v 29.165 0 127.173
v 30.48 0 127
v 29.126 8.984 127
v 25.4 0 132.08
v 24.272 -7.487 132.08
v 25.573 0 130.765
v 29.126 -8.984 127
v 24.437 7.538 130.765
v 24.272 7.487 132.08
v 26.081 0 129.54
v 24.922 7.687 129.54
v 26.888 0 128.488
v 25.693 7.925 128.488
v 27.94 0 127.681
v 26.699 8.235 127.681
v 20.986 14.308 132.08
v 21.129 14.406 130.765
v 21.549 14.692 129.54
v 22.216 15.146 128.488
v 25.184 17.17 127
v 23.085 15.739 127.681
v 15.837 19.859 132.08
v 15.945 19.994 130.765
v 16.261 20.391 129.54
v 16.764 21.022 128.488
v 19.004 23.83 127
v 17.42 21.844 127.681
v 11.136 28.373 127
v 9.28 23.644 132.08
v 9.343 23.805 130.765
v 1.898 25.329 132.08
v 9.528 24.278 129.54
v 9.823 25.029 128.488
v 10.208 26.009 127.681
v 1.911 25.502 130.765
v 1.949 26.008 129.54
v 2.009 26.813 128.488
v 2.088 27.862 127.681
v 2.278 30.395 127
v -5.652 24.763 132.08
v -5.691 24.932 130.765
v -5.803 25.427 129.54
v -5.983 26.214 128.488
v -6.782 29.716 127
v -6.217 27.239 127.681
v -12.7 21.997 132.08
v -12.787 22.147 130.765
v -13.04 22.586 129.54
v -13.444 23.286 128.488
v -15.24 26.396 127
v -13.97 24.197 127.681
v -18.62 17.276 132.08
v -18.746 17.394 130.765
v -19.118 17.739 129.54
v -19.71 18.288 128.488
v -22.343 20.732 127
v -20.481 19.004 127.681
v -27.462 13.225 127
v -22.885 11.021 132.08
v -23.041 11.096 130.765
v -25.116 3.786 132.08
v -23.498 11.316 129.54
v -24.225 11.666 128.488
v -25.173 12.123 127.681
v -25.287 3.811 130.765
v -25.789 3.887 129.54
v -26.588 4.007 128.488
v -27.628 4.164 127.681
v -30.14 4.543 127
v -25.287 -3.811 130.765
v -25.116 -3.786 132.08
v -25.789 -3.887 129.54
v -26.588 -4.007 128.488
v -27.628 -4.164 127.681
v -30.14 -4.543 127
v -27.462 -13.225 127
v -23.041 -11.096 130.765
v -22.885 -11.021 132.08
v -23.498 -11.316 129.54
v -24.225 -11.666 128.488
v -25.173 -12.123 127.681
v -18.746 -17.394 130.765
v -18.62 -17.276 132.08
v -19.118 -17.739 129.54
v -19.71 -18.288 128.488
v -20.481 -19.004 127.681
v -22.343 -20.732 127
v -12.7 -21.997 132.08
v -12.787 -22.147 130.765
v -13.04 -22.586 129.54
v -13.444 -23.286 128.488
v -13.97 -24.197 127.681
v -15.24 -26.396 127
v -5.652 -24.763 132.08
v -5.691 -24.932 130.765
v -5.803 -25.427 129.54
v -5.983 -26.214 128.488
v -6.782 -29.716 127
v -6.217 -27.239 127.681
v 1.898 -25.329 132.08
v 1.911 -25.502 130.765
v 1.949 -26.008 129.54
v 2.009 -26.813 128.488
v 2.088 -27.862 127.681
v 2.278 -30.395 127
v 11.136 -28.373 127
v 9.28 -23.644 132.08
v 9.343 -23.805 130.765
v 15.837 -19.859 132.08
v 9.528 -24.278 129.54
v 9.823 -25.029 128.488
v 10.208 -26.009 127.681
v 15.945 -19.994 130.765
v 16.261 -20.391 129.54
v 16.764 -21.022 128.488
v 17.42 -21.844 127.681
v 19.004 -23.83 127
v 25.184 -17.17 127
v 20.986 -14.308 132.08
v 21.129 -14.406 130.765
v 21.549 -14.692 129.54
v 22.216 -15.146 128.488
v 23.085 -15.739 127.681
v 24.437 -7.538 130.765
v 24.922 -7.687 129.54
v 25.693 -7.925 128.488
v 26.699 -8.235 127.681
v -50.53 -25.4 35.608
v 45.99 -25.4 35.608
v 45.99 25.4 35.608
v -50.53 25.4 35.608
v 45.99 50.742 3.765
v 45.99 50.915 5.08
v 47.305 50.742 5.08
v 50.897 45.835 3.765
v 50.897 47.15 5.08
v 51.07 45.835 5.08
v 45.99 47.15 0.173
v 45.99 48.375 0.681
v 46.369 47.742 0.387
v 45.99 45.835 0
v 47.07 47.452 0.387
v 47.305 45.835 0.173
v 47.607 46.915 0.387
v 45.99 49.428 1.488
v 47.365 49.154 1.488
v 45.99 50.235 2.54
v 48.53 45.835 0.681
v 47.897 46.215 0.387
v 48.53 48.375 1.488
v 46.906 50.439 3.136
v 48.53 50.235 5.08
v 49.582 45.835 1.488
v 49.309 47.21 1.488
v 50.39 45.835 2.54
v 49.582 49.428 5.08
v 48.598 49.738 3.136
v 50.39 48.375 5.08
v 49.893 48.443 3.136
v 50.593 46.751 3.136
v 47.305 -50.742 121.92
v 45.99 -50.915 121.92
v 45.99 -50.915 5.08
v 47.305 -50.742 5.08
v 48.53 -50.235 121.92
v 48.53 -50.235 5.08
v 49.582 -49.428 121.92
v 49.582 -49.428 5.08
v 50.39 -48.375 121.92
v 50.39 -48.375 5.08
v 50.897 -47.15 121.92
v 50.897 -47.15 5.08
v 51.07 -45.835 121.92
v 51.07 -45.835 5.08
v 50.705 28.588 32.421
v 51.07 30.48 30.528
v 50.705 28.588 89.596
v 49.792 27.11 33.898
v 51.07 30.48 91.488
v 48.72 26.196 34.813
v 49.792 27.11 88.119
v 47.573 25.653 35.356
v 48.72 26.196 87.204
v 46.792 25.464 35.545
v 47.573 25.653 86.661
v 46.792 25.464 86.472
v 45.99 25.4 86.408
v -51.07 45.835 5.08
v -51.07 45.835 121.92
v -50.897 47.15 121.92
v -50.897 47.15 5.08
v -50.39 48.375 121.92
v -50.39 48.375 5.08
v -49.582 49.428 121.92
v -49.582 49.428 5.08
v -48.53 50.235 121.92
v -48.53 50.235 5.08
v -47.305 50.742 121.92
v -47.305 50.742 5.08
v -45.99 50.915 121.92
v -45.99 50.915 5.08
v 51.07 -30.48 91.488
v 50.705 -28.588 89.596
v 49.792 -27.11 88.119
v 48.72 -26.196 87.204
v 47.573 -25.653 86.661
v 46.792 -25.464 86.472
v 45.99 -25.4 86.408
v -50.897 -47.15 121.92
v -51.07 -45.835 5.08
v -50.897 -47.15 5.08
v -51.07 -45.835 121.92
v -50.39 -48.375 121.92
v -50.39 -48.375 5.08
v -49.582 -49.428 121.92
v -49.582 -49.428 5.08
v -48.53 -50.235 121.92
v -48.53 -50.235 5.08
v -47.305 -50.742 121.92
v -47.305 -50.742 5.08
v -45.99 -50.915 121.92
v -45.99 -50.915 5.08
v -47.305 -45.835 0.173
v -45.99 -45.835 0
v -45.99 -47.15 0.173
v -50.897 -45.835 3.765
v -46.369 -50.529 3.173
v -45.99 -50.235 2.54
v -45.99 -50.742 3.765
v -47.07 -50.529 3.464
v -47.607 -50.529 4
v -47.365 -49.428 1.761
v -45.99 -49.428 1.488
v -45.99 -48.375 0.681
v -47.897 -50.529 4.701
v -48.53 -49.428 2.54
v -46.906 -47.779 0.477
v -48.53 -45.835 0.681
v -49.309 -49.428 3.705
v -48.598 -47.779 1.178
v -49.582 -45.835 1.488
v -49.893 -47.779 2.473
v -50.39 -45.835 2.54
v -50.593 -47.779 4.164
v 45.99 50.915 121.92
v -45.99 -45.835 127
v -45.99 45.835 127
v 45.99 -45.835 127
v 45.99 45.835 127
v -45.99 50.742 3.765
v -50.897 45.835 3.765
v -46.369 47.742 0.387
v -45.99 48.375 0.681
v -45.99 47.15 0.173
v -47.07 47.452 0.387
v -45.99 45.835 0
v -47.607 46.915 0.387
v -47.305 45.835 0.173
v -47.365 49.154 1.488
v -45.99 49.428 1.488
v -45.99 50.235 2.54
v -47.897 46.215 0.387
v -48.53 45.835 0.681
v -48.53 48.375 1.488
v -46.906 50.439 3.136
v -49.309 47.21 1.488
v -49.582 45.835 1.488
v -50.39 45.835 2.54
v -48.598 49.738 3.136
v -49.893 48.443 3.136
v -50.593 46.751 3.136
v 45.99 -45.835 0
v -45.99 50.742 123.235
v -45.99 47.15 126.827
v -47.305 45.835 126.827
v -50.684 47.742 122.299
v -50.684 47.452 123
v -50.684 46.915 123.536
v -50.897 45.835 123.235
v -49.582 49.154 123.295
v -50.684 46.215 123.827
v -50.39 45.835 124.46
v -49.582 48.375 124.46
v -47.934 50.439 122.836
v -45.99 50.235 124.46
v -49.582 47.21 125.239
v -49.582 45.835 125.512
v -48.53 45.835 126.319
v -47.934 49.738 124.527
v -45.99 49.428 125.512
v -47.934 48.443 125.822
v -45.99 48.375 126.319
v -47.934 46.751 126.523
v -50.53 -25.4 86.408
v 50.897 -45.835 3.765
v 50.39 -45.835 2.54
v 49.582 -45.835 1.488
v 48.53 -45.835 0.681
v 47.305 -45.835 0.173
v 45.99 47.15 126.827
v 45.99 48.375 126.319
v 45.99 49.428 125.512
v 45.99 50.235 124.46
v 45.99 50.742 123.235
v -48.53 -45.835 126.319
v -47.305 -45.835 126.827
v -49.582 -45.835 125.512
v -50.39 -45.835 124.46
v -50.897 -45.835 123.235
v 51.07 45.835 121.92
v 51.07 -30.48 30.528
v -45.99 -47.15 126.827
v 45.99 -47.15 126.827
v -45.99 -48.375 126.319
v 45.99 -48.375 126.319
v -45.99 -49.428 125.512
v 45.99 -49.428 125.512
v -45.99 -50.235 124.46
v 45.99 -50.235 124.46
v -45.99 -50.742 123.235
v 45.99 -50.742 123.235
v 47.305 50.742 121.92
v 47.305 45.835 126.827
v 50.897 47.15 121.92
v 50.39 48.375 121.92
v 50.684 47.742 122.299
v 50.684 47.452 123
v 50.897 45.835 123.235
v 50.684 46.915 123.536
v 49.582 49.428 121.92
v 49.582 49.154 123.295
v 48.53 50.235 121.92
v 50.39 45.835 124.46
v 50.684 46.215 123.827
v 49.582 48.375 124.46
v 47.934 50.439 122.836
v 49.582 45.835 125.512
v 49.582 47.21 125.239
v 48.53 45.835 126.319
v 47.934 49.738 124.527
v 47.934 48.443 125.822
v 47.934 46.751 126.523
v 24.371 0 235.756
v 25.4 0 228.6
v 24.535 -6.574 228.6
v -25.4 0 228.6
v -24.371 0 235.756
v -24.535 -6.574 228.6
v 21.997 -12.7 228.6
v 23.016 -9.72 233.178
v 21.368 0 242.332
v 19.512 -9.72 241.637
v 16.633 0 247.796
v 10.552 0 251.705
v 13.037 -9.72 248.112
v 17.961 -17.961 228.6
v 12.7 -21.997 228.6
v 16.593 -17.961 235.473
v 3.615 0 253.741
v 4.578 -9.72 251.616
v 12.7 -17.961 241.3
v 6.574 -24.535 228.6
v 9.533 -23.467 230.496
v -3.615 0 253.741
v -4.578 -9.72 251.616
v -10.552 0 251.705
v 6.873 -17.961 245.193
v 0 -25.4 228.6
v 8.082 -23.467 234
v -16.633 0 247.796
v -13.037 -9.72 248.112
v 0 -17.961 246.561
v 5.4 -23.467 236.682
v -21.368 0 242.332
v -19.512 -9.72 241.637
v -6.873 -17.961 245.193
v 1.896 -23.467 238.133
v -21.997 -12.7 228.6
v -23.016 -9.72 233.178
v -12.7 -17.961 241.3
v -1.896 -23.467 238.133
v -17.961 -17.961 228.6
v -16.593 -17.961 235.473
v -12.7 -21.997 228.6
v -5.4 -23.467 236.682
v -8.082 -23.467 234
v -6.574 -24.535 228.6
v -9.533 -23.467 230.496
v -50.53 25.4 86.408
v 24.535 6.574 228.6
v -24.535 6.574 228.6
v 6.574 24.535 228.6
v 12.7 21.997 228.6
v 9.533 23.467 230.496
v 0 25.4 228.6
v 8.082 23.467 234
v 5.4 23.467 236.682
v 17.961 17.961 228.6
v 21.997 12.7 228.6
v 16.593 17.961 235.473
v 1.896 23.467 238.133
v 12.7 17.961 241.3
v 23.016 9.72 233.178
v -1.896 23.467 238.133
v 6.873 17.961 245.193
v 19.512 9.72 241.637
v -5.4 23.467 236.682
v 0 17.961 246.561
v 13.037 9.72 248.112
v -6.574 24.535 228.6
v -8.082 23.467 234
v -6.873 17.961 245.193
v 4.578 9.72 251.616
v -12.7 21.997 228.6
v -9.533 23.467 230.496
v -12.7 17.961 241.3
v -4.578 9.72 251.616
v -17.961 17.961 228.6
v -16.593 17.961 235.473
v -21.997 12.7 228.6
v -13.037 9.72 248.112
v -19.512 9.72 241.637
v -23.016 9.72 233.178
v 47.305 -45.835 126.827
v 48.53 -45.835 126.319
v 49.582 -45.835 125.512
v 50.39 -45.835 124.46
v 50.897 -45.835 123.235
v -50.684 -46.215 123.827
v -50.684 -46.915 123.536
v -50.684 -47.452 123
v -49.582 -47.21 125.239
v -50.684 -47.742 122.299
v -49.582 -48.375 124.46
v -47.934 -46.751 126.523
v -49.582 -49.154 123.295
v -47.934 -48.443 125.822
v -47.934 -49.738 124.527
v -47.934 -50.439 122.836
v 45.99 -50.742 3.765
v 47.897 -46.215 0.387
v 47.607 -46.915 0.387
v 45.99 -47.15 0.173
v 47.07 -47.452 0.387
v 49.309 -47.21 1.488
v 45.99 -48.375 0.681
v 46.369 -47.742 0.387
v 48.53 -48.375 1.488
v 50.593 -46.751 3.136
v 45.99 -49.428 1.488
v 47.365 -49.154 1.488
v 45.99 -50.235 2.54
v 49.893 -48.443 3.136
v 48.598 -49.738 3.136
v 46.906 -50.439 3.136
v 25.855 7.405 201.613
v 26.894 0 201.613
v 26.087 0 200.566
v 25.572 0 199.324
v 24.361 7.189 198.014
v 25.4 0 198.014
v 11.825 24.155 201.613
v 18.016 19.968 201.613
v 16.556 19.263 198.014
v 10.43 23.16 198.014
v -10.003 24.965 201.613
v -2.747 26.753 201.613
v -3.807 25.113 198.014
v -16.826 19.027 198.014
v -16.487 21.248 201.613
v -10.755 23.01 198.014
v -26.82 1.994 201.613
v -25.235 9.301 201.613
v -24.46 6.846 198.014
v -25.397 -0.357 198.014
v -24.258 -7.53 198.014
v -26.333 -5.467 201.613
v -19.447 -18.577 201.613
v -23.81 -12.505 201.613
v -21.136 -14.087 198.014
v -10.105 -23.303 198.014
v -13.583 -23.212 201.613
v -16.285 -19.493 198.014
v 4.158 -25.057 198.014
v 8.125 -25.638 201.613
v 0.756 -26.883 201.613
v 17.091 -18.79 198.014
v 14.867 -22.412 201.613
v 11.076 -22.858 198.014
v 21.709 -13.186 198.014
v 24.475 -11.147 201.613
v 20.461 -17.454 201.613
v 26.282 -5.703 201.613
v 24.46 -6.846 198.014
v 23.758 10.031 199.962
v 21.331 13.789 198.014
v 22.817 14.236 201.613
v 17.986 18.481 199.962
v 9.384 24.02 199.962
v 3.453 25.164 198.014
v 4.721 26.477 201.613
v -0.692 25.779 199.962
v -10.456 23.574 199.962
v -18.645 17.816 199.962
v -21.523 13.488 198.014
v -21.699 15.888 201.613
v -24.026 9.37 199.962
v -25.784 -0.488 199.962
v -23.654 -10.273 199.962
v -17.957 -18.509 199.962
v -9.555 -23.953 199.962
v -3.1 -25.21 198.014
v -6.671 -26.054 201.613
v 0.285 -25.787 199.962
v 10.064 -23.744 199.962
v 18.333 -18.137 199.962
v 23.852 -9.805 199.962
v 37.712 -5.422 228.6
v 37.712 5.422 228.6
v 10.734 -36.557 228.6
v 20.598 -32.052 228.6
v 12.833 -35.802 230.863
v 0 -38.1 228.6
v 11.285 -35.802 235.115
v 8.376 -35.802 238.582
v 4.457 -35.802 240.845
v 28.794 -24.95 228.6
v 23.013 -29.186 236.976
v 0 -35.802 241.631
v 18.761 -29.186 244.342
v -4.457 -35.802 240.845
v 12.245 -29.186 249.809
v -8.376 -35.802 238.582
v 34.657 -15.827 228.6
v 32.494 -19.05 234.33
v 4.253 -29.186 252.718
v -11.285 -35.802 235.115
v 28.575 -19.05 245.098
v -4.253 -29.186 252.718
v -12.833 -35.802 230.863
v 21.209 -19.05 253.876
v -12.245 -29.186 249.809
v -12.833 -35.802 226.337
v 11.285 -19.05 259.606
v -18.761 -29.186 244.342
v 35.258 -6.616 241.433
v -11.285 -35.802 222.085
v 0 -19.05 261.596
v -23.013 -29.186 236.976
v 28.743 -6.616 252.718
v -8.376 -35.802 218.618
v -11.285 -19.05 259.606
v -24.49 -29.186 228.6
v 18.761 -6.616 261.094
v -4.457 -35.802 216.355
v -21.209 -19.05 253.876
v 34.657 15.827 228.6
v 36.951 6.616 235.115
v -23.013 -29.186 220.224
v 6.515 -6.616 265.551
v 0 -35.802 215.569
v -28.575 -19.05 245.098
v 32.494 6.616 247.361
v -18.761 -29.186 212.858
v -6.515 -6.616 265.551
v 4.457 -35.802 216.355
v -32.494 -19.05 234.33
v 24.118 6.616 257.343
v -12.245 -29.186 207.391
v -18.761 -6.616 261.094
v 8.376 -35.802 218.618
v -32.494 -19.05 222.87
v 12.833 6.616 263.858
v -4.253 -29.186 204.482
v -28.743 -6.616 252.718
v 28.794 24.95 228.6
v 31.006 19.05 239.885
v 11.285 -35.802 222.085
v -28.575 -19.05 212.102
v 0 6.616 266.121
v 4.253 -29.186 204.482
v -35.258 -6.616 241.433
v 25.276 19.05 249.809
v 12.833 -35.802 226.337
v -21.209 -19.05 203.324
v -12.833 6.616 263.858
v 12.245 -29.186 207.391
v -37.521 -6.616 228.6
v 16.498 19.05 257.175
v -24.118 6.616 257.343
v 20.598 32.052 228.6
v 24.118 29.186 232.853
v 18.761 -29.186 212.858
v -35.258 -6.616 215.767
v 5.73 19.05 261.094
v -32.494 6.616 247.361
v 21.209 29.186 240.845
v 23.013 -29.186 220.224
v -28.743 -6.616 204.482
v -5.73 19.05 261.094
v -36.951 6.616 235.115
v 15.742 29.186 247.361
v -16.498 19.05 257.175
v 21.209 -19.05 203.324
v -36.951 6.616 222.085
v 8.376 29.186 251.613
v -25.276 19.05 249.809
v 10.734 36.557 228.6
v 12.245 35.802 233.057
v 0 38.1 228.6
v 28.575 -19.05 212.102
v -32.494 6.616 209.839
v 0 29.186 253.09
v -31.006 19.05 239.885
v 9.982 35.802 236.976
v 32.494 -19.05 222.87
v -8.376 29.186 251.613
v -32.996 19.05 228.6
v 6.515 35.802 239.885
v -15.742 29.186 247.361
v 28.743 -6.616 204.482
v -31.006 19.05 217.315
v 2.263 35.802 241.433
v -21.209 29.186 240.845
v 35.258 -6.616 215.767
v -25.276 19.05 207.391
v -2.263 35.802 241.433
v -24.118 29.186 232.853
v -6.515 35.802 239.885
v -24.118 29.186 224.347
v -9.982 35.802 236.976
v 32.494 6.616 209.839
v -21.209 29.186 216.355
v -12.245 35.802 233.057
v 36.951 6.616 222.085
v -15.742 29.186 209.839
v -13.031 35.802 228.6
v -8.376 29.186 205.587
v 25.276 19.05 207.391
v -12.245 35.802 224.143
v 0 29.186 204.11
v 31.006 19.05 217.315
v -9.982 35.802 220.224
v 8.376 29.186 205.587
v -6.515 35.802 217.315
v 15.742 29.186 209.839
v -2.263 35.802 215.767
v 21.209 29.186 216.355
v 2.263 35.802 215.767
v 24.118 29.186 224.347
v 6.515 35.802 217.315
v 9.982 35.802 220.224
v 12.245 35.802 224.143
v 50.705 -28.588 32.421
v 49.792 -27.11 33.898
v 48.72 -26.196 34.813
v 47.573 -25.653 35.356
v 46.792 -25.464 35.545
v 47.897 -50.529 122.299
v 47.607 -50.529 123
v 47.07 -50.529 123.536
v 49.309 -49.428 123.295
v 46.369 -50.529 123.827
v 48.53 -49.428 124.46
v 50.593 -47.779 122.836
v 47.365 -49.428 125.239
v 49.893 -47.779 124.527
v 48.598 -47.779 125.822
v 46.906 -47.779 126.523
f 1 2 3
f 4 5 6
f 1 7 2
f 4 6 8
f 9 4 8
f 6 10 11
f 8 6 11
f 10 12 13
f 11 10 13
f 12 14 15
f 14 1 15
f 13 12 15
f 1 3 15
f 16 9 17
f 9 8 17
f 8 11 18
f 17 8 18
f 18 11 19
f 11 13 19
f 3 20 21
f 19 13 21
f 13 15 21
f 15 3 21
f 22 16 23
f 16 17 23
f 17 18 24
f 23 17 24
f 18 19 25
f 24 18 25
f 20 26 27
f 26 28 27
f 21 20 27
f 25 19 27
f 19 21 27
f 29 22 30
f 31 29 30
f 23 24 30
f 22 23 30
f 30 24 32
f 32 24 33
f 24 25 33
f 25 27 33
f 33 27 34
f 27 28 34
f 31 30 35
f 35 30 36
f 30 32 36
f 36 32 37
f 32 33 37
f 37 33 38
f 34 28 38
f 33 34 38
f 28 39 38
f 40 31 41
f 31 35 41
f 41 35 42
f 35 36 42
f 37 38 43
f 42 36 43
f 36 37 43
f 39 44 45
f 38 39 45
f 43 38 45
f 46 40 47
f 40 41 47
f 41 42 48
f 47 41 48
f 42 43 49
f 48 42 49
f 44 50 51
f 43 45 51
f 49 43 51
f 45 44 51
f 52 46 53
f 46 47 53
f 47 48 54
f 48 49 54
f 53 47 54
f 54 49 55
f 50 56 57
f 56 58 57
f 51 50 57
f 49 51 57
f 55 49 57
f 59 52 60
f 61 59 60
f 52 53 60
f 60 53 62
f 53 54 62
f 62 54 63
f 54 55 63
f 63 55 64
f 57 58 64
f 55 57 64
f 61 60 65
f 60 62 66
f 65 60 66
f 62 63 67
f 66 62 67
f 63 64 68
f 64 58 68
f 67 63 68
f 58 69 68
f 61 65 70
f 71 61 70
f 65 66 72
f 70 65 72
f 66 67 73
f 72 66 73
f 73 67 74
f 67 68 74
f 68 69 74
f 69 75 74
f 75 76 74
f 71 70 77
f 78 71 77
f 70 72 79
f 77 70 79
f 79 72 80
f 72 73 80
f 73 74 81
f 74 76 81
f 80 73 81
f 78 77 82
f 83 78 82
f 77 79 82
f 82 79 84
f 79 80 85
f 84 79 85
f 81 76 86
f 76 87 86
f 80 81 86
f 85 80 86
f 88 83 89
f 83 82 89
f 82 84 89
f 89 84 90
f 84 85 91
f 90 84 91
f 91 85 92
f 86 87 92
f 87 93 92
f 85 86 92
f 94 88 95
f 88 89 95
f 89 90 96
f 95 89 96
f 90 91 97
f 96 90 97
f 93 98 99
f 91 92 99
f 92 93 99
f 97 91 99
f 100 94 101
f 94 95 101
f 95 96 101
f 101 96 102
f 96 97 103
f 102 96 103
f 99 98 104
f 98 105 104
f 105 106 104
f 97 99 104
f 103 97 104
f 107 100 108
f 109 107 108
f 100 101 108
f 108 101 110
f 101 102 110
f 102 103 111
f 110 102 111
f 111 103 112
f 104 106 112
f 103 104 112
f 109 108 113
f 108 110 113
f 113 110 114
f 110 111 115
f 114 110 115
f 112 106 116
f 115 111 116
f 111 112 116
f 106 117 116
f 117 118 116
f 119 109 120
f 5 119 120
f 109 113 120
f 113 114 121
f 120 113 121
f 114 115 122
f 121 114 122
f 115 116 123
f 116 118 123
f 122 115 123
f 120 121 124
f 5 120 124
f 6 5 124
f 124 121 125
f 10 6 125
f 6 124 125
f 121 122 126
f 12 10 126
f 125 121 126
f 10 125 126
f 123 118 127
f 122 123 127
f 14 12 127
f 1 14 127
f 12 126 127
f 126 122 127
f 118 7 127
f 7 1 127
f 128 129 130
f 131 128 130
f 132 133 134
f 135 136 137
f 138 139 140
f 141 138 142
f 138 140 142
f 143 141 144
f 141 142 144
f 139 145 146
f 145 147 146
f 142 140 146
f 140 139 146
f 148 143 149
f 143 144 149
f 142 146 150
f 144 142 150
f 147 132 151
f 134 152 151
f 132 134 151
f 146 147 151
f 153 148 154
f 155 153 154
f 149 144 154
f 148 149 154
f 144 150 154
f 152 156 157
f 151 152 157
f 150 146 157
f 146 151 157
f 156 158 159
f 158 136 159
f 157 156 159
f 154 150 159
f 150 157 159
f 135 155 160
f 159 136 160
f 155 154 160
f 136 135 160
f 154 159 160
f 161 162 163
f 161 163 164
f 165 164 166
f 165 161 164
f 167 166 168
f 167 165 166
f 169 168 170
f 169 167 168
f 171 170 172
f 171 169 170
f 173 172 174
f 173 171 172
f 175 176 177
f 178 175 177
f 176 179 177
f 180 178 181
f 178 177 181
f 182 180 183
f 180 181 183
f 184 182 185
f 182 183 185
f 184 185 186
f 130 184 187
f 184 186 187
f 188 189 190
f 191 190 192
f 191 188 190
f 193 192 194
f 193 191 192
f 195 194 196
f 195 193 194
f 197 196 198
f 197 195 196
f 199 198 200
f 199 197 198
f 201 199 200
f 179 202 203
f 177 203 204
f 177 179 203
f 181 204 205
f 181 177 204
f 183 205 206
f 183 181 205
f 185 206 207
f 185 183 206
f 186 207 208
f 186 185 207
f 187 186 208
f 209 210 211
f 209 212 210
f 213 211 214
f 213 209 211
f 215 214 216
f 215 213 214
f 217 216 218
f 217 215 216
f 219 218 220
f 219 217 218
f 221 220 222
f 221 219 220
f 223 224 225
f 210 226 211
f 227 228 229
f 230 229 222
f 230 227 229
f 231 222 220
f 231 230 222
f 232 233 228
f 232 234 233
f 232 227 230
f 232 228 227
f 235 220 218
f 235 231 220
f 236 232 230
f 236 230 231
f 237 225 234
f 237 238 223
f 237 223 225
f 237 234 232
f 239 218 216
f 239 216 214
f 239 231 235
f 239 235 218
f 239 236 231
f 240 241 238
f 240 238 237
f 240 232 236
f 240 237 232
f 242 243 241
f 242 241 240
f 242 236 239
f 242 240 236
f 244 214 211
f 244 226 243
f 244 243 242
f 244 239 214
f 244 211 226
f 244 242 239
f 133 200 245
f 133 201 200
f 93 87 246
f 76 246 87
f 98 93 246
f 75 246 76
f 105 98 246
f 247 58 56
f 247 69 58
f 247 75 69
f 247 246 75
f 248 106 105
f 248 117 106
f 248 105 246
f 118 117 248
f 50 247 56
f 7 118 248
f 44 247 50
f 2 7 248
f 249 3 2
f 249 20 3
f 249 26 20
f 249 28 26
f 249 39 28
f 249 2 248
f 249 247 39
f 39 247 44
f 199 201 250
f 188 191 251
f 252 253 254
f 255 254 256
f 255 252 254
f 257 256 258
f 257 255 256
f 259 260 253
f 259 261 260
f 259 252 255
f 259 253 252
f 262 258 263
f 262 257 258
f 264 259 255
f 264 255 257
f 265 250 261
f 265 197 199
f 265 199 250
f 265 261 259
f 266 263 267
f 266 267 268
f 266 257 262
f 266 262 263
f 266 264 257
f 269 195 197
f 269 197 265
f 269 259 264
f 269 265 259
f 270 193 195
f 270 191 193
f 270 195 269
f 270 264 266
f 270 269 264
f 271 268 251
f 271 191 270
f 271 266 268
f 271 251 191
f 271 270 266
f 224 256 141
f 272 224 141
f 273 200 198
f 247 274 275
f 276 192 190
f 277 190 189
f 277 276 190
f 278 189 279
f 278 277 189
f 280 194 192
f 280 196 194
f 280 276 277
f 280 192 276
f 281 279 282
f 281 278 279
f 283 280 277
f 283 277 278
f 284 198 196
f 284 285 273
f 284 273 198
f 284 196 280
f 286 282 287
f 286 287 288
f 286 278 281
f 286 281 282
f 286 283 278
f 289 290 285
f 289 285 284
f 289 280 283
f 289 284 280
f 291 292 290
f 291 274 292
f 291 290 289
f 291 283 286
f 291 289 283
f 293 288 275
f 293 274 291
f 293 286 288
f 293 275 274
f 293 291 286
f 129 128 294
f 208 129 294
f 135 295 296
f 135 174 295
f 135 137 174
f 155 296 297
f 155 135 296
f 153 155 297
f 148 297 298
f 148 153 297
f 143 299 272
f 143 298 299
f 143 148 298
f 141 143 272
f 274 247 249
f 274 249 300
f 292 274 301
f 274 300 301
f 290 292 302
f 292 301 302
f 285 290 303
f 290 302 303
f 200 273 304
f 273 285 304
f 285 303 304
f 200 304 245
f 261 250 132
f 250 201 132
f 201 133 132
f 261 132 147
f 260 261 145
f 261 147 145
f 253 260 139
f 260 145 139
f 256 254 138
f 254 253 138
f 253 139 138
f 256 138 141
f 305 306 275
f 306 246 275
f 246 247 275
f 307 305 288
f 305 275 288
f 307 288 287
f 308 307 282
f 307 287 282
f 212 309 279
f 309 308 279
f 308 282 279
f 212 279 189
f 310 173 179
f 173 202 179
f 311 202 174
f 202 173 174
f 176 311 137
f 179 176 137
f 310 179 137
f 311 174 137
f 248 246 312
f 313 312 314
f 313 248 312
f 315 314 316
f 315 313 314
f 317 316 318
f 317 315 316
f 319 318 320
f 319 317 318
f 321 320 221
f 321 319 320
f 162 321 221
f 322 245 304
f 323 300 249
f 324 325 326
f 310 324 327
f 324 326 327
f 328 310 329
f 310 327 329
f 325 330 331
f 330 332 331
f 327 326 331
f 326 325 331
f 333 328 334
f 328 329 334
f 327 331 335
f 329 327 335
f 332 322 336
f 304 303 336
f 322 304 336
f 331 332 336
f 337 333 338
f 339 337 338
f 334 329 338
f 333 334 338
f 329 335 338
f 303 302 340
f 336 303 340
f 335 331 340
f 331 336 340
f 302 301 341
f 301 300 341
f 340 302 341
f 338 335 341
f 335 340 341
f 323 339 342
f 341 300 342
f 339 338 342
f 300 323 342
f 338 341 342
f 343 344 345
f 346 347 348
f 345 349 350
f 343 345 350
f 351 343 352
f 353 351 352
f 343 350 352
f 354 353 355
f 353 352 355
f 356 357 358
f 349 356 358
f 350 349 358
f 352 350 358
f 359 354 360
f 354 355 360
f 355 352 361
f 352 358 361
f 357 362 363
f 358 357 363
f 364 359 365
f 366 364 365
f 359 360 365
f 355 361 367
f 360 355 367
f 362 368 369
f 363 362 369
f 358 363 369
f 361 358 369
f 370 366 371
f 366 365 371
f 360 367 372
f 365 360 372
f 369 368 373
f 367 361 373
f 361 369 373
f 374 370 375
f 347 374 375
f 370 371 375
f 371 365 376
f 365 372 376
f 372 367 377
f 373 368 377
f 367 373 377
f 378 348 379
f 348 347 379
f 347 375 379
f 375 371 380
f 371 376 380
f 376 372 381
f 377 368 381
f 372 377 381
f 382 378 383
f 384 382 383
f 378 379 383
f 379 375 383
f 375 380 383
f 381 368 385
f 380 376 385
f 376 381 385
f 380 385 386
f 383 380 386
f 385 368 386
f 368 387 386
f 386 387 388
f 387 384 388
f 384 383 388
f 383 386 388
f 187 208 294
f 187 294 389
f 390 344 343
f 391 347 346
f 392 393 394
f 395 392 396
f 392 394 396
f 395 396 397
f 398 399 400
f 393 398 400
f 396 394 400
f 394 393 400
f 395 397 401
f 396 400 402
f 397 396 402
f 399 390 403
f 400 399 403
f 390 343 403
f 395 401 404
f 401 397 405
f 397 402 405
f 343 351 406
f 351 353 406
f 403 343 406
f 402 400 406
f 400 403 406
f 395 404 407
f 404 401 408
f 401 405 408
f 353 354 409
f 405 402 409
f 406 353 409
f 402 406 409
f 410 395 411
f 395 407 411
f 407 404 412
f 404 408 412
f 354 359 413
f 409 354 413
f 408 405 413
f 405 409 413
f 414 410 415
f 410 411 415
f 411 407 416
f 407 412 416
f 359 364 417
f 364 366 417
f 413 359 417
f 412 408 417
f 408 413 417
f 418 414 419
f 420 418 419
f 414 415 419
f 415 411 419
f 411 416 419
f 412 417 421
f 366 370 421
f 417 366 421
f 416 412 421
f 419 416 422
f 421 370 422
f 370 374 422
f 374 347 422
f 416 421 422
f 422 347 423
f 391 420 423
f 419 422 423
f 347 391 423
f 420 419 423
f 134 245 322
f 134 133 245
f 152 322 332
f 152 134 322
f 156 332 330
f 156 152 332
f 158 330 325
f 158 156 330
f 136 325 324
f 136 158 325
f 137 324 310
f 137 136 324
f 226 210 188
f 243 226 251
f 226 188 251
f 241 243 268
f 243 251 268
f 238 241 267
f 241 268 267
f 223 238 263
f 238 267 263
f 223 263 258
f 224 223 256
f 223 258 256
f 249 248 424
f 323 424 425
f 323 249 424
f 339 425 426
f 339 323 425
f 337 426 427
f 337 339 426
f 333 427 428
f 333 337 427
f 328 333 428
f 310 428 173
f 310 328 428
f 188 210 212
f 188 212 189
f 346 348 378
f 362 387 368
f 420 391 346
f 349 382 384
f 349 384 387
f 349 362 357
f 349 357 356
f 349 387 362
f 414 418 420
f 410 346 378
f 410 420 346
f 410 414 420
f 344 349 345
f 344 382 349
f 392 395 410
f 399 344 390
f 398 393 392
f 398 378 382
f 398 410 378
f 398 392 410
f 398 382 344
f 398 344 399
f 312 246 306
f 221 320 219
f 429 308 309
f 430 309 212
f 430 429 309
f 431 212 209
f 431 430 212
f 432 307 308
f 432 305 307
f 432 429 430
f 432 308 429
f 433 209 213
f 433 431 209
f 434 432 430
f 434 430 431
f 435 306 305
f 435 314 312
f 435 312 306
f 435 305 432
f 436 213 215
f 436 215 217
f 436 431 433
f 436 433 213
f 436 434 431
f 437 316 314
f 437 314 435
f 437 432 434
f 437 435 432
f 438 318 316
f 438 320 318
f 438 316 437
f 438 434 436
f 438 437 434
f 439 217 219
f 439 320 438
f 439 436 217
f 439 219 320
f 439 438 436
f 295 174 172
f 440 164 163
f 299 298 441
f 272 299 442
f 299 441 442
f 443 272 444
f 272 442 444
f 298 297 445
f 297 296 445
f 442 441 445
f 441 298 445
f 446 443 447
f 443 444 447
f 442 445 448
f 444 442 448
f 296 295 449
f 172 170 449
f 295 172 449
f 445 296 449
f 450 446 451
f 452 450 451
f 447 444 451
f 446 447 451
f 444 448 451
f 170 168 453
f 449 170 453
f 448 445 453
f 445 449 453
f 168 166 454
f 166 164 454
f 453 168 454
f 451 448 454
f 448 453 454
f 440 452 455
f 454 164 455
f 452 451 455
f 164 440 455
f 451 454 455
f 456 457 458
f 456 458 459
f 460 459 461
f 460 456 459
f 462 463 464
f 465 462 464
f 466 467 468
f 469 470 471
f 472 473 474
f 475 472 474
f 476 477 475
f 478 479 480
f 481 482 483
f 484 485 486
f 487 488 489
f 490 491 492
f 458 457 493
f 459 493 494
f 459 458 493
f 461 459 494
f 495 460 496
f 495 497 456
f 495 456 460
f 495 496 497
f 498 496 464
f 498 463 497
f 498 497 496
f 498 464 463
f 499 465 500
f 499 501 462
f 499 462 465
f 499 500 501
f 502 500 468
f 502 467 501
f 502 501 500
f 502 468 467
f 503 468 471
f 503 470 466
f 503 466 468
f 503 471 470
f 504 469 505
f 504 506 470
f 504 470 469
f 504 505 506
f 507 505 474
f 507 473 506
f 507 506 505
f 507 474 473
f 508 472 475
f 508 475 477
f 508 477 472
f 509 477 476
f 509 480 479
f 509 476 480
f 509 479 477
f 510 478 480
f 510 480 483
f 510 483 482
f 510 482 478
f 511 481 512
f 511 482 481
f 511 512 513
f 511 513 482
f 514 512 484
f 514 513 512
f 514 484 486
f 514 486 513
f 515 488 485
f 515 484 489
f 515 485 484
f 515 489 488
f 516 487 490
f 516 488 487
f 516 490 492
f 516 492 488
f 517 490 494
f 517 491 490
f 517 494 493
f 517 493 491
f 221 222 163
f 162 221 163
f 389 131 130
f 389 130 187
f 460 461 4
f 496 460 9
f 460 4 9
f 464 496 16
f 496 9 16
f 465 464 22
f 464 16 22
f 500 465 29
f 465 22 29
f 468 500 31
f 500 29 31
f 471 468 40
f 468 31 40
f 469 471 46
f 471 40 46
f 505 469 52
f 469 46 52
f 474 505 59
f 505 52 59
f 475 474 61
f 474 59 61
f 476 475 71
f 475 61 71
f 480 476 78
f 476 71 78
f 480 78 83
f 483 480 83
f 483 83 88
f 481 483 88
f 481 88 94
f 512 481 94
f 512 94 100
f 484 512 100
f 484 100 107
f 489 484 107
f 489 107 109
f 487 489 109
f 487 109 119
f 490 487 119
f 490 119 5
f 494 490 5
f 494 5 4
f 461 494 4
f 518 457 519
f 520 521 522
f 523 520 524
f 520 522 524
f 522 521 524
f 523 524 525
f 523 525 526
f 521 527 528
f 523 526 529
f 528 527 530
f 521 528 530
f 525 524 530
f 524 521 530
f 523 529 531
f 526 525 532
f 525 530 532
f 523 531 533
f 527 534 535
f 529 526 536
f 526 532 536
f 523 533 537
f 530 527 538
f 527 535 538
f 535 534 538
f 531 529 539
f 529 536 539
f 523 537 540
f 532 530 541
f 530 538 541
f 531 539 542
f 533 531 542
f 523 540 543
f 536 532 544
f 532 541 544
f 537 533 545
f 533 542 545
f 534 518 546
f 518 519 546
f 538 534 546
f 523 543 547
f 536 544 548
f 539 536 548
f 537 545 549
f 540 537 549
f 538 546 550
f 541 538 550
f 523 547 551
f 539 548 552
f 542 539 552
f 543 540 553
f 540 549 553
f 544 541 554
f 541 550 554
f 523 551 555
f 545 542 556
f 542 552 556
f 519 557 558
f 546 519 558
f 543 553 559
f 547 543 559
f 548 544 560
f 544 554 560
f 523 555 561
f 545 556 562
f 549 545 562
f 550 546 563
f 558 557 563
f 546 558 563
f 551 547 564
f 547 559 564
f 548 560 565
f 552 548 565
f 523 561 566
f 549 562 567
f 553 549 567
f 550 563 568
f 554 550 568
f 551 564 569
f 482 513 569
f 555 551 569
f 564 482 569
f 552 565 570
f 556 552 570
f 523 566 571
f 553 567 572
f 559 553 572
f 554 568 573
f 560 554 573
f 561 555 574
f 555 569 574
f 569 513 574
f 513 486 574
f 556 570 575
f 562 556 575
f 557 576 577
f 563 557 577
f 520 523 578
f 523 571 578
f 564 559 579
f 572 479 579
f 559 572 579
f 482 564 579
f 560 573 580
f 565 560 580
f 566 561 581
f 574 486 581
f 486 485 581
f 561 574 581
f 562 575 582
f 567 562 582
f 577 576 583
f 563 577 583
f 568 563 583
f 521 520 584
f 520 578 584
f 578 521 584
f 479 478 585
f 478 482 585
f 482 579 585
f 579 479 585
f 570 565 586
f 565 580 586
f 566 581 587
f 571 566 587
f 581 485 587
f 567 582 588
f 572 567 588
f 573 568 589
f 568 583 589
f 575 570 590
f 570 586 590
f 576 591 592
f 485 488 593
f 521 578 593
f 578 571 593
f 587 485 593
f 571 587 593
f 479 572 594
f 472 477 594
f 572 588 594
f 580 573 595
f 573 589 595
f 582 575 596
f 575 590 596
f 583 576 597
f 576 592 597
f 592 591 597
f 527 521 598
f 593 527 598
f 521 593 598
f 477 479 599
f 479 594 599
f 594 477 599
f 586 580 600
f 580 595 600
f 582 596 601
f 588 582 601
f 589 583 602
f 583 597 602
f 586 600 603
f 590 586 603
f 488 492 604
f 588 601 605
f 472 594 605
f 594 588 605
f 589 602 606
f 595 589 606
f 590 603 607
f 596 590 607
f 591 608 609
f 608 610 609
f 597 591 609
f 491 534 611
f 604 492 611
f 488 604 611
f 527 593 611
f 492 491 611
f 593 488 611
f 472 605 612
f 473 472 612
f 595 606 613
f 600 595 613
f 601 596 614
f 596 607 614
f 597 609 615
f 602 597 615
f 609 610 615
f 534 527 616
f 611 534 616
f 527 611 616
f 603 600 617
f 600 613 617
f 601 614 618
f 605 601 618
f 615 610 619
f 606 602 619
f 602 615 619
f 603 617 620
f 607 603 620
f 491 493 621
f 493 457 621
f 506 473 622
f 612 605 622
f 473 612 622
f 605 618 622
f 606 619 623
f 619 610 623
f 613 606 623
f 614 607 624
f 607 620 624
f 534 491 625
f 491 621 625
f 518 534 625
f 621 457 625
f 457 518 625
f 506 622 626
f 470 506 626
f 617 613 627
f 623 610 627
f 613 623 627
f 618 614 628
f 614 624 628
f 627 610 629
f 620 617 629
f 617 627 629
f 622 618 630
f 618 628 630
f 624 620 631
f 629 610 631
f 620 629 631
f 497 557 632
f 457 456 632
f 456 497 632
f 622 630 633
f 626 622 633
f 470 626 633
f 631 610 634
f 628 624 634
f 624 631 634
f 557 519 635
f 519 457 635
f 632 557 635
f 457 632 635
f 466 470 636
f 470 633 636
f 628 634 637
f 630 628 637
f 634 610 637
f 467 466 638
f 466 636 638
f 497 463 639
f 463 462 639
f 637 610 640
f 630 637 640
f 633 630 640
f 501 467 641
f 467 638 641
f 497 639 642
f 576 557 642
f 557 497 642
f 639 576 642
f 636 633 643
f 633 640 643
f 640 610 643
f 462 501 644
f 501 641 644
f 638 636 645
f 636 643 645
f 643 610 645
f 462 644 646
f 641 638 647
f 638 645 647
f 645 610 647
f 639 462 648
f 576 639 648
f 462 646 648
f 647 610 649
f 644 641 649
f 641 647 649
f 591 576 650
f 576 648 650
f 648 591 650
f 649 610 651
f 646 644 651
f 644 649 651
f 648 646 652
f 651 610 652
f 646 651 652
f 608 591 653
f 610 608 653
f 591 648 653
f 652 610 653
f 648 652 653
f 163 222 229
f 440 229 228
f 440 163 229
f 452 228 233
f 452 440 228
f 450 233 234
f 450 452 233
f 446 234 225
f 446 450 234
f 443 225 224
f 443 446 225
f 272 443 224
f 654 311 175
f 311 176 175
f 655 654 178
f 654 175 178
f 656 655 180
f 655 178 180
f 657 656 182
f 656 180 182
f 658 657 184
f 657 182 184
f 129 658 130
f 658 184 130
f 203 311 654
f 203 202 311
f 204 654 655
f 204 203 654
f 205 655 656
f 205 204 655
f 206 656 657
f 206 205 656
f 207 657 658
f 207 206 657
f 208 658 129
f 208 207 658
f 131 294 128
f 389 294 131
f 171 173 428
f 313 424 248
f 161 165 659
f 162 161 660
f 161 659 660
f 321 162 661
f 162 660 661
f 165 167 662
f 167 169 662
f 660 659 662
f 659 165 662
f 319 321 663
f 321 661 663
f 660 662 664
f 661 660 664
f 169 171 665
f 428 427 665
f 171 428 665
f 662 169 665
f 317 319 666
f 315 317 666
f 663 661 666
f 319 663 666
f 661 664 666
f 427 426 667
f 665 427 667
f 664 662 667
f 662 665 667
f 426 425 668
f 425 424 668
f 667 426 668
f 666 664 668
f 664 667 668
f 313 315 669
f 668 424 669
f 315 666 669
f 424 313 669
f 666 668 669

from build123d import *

# Parameters (mm, degrees)
F0_W     = 102.1404191852
F0_H     = 101.830907166
F1_DEPTH = 101.6
F2_DEPTH = 25.4
F3_R     = 25.4
F4_DEPTH = 101.6
F7_W     = 50.8
F7_H     = 50.8
F8_DEPTH = 101.6
F9_R     = 5.08


with BuildPart() as f1:
    # F0 (on Top) → F1 (new body)
    with BuildSketch(Plane.XY):
        Rectangle(F0_W, F0_H)
    extrude(amount=F1_DEPTH)

    # F2 (add): a face of the model
    f2_faces = [f1.faces().sort_by_distance(p)[0] for p in [
        (0, 0, 101.6),
    ]]
    extrude(f2_faces, amount=F2_DEPTH)

    # F3 (on face) → F4 (join)
    with BuildSketch(Plane.XY.offset(127)):
        Circle(F3_R)
    extrude(amount=F4_DEPTH)

    # F5 (on face) → F6 (revolve)
    with BuildSketch(Plane.XY.offset(228.6)):
        with BuildLine():
            Line((0, -25.4), (0, -38.1))
            ThreePointArc((0, -38.1), (38.1, 0), (0, 38.1))
            Line((0, 38.1), (0, 25.4))
            ThreePointArc((0, 25.4), (17.9605122421, 17.9605122421), (25.4, 0))
            ThreePointArc((25.4, 0), (17.9605122421, -17.9605122421), (0, -25.4))
        make_face()
    revolve(axis=Axis((0, 0, 228.6), (0, -1, 0)))

    # F7 (on face) → F8 (cut)
    with BuildSketch(Plane.YZ.offset(51.0702095926)):
        with Locations((0, 61.0084416688)):
            Rectangle(F7_W, F7_H)
    extrude(amount=-F8_DEPTH, mode=Mode.SUBTRACT)

    # F9
    f9_edges = [f1.edges().sort_by_distance(p)[0] for p in [
        (0, 50.915454, 127),
        (51.07021, 50.915454, 63.5),
        (-51.07021, 50.915454, 63.5),
        (0, 50.915454, 0),
        (51.07021, 0, 127),
        (51.07021, -50.915454, 63.5),
        (51.07021, 0, 0),
        (51.07021, 0, 86.408442),
        (51.07021, 25.4, 61.008442),
        (51.07021, 0, 35.608442),
        (51.07021, -25.4, 61.008442),
        (-51.07021, 0, 0),
        (0, -50.915454, 0),
        (0, -50.915454, 127),
        (-51.07021, 0, 127),
        (-51.07021, -50.915454, 63.5),
        (-25.4, 0, 200.201937),
        (-25.4, 0, 127),
        (25.4, 0, 163.600968),
    ]]
    fillet(f9_edges, radius=F9_R)


solid = f1.part
